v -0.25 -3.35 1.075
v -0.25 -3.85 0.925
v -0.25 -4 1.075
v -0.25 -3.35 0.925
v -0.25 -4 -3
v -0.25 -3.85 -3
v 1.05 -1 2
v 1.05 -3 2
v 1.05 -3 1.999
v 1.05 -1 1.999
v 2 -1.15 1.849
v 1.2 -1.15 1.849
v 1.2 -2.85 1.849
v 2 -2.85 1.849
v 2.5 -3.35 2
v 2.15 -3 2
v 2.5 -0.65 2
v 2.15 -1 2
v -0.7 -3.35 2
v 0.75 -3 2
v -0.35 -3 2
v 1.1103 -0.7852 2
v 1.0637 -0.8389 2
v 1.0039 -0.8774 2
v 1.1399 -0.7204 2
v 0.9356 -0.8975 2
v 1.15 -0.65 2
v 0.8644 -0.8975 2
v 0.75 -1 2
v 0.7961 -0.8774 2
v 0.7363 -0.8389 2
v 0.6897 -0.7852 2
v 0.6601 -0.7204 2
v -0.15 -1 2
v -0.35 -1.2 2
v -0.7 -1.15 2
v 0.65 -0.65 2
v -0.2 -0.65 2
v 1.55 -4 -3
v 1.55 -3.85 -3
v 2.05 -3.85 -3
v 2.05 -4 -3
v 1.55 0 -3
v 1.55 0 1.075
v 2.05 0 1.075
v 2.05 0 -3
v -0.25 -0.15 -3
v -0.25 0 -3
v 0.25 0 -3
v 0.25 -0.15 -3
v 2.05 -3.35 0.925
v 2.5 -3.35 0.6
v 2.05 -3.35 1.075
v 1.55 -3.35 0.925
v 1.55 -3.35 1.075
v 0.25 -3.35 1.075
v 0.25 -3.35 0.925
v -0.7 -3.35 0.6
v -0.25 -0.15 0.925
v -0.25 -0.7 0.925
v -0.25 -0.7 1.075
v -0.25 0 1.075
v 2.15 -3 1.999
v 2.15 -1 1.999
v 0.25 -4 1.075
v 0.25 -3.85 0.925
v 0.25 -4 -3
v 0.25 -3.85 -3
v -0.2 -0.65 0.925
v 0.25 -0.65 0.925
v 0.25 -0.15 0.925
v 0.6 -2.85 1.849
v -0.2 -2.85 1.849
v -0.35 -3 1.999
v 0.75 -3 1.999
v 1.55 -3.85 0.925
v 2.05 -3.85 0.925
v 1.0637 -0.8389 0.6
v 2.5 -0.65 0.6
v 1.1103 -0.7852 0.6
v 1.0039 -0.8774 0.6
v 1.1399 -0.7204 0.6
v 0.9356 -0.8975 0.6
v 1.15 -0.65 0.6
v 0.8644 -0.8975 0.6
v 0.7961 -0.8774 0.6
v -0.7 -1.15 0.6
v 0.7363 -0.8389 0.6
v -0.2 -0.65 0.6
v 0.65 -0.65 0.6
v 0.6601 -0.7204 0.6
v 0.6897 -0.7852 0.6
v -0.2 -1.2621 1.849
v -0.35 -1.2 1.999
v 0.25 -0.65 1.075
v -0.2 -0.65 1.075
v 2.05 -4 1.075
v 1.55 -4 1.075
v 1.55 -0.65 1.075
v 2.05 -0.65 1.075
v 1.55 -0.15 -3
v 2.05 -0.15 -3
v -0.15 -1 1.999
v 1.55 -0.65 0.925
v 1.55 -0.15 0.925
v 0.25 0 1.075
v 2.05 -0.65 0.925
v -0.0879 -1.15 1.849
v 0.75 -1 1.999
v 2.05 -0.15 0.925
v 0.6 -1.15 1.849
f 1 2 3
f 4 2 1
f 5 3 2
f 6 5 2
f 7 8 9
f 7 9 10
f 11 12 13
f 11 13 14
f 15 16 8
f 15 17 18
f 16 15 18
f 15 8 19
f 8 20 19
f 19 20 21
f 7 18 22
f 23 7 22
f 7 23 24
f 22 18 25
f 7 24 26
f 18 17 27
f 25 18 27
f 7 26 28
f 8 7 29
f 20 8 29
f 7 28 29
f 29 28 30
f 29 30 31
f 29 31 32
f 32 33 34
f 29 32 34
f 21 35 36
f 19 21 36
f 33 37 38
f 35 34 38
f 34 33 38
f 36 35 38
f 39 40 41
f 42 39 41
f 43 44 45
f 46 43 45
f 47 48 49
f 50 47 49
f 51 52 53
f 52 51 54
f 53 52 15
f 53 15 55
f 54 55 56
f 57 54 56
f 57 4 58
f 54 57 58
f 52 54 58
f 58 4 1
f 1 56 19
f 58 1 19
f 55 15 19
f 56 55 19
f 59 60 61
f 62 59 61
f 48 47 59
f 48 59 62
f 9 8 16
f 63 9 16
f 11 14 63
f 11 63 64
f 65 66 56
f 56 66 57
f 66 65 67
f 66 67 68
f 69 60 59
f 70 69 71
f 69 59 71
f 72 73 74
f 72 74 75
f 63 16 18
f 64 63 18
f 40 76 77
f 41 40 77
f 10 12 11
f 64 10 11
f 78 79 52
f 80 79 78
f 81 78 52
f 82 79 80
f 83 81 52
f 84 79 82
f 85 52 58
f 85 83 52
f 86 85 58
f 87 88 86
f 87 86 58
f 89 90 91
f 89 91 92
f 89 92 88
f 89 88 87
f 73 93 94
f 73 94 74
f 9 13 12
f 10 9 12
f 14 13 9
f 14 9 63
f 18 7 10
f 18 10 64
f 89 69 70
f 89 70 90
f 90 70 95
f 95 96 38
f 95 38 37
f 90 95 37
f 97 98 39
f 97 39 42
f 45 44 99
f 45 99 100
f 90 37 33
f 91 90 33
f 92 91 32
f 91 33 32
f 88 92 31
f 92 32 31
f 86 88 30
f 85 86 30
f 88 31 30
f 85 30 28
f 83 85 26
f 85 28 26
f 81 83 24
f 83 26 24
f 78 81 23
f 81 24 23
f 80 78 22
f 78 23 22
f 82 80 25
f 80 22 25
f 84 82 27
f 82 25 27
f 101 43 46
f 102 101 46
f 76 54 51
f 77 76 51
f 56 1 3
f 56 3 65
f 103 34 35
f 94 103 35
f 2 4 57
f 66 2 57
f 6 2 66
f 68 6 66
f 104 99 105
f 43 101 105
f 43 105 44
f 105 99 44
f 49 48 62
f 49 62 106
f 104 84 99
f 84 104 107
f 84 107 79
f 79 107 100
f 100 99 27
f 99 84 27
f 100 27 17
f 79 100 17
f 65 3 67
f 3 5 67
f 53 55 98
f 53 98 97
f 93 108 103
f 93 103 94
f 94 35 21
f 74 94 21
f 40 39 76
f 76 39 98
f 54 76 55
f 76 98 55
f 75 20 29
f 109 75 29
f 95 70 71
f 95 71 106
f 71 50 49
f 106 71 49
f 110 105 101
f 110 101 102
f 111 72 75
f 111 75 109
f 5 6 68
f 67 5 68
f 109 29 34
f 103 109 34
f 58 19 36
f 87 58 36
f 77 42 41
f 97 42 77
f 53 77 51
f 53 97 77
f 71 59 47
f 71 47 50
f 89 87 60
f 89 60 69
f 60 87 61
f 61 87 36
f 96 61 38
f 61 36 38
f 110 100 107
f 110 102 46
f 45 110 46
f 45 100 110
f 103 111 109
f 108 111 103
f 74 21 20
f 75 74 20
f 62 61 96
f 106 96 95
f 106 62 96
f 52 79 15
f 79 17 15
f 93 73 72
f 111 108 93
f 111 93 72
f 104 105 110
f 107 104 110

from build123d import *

# Parameters (mm, degrees)
PAD_DEPTH       = 1
PAD_DEPTH_BACK  = 0.4
SKETCH001_W     = 1.1
SKETCH001_H     = 2
POCKET_DEPTH    = 0.151
CHAMFER_SIZE    = 0.15
SKETCH004_R     = 0.25
POCKET001_DEPTH = 1.401
SKETCH002_W     = 0.5
SKETCH002_H     = 4
PAD001_DEPTH    = 0.075
SKETCH003_W     = 0.5
SKETCH003_H     = 0.15
PAD002_DEPTH    = 4


with BuildPart() as pocket001:
    # Sketch → Pad (new body, two sides)
    with BuildSketch(Plane(origin=(0.9, -2, 1), x_dir=(1, 0, 0), z_dir=(0, 0, 1))) as pad_sk:
        Polygon((-1.1, 1.35), (1.6, 1.35), (1.6, -1.35), (-1.6, -1.35), (-1.6, 0.85), align=None)
    extrude(amount=PAD_DEPTH)
    extrude(pad_sk.sketch, amount=-PAD_DEPTH_BACK)

    # Sketch001 → Pocket (cut)
    with BuildSketch(Plane(origin=(0.9, -2, 2), x_dir=(1, 0, 0), z_dir=(0, 0, 1))):
        Polygon((-1.25, -1), (-0.15, -1), (-0.15, 1), (-1.05, 1), (-1.25, 0.8), align=None)
        with Locations((0.7, 0)):
            Rectangle(SKETCH001_W, SKETCH001_H)
    extrude(amount=-POCKET_DEPTH, mode=Mode.SUBTRACT)

    # Chamfer
    chamfer_edges = [pocket001.edges().sort_by_distance(p)[0] for p in [
        (-0.25, -1.1, 1.849),
        (0.3, -1, 1.849),
        (-0.35, -2.1, 1.849),
        (1.05, -2, 1.849),
        (1.6, -1, 1.849),
        (2.15, -2, 1.849),
        (0.75, -2, 1.849),
        (1.6, -3, 1.849),
        (0.2, -3, 1.849),
    ]]
    chamfer(chamfer_edges, length=CHAMFER_SIZE)

    # Sketch004 → Pocket001 (cut, through all)
    with BuildSketch(Plane(origin=(0.9, -2, 2), x_dir=(1, 0, 0), z_dir=(0, 0, 1))):
        with Locations((0, 1.35)):
            Circle(SKETCH004_R)
    extrude(amount=-POCKET001_DEPTH, mode=Mode.SUBTRACT)


with BuildPart() as pad001:
    # Sketch002 → Pad001 (new body, symmetric)
    with BuildSketch(Plane(origin=(0.9, -2, 1), x_dir=(1, 0, 0), z_dir=(0, 0, 1))):
        with Locations((-0.9, 0)):
            Rectangle(SKETCH002_W, SKETCH002_H)
        with Locations((0.9, 0)):
            Rectangle(SKETCH002_W, SKETCH002_H)
    extrude(amount=PAD001_DEPTH, both=True)


with BuildPart() as kodenshi_sg105f:
    # Sketch003 → Pad002 (new body)
    with BuildSketch(Plane(origin=(0.9, -2, 1), x_dir=(1, 0, 0), z_dir=(0, 0, 1))):
        with Locations((-0.9, 1.925)):
            Rectangle(SKETCH003_W, SKETCH003_H)
        with Locations((0.9, 1.925)):
            Rectangle(SKETCH003_W, SKETCH003_H)
        with Locations((-0.9, -1.925)):
            Rectangle(SKETCH003_W, SKETCH003_H)
        with Locations((0.9, -1.925)):
            Rectangle(SKETCH003_W, SKETCH003_H)
    extrude(amount=-PAD002_DEPTH)

    # Pad002_mp_cp: union Pocket001, Pad001
    add(pocket001.part)
    add(pad001.part)


solid = kodenshi_sg105f.part
